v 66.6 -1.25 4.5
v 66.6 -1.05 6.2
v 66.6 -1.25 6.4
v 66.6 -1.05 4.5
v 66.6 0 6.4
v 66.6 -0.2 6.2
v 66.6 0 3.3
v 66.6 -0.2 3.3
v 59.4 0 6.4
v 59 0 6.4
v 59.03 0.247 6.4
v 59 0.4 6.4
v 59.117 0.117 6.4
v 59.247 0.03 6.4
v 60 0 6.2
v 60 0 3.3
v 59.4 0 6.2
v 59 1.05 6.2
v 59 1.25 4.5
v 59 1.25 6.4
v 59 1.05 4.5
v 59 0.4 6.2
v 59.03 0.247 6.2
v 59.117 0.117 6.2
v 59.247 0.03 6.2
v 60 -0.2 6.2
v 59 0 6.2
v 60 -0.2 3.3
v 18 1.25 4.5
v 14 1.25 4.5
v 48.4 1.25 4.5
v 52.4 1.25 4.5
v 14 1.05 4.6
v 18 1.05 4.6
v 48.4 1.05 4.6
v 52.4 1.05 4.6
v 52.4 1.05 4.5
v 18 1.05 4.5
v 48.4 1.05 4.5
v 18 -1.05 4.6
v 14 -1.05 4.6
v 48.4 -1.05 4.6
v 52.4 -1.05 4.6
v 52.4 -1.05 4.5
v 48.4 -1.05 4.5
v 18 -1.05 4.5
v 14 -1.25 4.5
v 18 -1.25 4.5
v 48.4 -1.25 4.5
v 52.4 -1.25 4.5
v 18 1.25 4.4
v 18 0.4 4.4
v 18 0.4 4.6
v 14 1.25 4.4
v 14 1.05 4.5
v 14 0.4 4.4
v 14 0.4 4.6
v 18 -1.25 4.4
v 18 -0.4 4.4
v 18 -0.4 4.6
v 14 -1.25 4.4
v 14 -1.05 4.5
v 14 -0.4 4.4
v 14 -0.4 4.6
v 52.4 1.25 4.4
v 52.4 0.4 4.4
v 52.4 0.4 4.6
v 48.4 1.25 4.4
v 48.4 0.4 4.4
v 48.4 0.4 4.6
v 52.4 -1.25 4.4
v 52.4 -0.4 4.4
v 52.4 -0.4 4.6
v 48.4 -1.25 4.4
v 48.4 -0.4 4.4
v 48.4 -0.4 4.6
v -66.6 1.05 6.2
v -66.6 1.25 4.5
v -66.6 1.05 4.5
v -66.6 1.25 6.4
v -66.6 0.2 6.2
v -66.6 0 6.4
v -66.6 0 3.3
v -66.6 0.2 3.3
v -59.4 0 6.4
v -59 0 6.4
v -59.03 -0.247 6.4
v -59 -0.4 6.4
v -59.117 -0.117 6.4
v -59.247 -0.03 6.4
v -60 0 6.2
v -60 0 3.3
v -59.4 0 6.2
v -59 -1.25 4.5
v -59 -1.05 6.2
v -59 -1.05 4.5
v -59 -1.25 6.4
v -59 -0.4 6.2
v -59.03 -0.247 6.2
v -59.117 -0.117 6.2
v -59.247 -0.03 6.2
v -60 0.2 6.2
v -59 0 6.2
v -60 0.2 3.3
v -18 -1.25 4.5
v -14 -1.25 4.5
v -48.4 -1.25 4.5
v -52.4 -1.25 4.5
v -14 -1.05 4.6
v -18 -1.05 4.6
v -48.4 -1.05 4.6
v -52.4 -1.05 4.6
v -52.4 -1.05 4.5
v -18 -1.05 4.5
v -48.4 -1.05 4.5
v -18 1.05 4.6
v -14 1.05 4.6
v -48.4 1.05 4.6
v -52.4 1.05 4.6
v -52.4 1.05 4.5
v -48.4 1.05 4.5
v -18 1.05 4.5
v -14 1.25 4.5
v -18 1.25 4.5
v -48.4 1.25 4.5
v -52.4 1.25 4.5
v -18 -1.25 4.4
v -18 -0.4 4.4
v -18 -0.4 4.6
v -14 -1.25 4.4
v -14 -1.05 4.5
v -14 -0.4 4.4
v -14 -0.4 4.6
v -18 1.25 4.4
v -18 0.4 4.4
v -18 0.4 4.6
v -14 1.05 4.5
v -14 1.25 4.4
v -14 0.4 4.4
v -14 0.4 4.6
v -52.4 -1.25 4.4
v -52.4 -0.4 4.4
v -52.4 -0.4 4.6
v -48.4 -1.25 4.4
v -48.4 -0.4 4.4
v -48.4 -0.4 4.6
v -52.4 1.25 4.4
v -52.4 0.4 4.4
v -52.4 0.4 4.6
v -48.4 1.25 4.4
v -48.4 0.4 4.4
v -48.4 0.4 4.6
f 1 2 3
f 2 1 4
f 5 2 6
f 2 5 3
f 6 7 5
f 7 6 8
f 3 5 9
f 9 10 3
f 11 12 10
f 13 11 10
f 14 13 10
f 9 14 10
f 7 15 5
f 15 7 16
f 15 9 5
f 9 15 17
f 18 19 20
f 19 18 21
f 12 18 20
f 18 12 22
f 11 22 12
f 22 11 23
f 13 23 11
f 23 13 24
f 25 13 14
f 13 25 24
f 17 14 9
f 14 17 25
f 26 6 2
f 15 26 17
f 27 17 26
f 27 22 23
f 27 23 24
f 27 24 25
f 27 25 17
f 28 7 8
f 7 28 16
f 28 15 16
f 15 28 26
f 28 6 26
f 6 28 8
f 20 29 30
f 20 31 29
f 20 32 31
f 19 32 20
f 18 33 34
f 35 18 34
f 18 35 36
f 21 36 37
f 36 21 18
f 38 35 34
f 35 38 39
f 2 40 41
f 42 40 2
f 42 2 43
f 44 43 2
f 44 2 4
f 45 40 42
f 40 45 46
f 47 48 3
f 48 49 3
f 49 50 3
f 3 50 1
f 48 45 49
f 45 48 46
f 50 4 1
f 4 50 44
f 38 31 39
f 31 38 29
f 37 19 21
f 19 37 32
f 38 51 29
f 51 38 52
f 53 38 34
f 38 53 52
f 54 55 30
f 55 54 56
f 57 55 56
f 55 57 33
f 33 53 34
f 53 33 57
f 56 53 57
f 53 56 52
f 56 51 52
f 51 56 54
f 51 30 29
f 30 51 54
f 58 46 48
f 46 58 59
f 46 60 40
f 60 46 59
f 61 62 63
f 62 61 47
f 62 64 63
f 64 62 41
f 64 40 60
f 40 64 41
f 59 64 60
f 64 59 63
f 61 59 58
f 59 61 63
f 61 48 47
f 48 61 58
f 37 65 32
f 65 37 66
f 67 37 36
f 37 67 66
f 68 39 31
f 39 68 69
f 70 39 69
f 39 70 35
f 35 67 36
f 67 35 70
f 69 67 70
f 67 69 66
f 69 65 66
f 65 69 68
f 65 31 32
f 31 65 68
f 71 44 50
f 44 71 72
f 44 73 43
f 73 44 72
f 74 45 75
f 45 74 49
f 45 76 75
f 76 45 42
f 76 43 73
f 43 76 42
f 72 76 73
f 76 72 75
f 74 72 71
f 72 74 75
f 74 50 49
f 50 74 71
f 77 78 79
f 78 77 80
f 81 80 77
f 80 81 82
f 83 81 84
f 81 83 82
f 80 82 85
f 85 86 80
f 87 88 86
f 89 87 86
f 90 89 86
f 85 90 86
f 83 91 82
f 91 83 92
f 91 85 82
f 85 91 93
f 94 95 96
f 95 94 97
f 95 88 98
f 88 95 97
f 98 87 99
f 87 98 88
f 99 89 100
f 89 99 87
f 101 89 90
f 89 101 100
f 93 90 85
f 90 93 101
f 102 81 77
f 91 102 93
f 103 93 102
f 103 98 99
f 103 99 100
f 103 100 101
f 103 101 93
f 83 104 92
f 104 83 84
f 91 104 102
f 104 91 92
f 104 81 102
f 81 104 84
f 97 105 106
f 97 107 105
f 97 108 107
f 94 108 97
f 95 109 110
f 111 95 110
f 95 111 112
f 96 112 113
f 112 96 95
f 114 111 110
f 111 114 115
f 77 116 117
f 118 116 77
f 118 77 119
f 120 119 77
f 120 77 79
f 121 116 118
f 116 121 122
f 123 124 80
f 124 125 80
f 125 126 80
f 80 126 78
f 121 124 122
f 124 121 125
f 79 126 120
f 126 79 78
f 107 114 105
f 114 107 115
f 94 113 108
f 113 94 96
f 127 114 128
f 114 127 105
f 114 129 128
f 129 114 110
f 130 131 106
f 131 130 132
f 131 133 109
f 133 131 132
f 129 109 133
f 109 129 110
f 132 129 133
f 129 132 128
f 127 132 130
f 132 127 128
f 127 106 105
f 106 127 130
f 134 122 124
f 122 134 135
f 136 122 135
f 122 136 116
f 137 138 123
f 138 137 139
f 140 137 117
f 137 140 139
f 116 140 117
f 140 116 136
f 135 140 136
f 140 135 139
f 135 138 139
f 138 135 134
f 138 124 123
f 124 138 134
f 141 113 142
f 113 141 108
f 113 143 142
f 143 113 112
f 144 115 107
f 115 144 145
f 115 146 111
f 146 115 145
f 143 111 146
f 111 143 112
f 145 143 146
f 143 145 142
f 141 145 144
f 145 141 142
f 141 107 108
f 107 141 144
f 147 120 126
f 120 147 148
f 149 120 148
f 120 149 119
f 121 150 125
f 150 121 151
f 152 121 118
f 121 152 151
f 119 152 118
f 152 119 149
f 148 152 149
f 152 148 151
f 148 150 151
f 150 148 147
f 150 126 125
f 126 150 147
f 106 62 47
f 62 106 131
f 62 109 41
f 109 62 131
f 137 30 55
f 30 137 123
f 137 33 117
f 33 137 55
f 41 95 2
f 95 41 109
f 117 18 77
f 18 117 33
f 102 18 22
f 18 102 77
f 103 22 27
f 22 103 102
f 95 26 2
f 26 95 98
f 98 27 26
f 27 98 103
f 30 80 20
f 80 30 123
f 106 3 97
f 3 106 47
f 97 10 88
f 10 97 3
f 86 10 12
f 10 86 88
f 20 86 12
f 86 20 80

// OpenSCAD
// file: ../p/1-4edge.scad
use <../lib.scad>
function ldraw_lib__1_4edge() = [
// 0 Circle 0.25
// 0 Name: 1-4edge.dat
// 0 Author: James Jessiman
// 0 !LDRAW_ORG Primitive UPDATE 2017-01
// 0 !LICENSE Licensed under CC BY 4.0 : see CAreadme.txt
// 
// 0 BFC CERTIFY CCW
  [0,"BFC","CERTIFY"],
  [0,"BFC","CCW"],
// 
// 0 !HISTORY 2007-06-22 [PTadmin] Header formatted for Contributor Agreement
// 0 !HISTORY 2008-07-01 [PTadmin] Official Update 2008-01
// 0 !HISTORY 2017-01-15 [Steffen] BFCed
// 0 !HISTORY 2017-12-30 [PTadmin] Official Update 2017-01
// 
// 
// 2 24 1 0 0 0.9239 0 0.3827
  [2,24,1,0,0,0.9239,0,0.3827],
// 2 24 0.9239 0 0.3827 0.7071 0 0.7071
  [2,24,0.9239,0,0.3827,0.7071,0,0.7071],
// 2 24 0.7071 0 0.7071 0.3827 0 0.9239
  [2,24,0.7071,0,0.7071,0.3827,0,0.9239],
// 2 24 0.3827 0 0.9239 0 0 1
  [2,24,0.3827,0,0.9239,0,0,1],
];
module ldraw_lib__1_4edge(step=0, col=false, unit=2/5, alt=false, line=0.2, solid=!$preview)
    makepoly(ldraw_lib__1_4edge(), step=step, col=col, unit=unit, alt=alt, line=line, solid=solid);
ldraw_lib__1_4edge(line=0.2);
// file: ../p/1-4cyli.scad
use <../lib.scad>
function ldraw_lib__1_4cyli() = [
// 0 Cylinder 0.25
// 0 Name: 1-4cyli.dat
// 0 Author: James Jessiman
// 0 !LDRAW_ORG Primitive UPDATE 2012-01
// 0 !LICENSE Licensed under CC BY 4.0 : see CAreadme.txt
// 
// 0 BFC CERTIFY CCW
  [0,"BFC","CERTIFY"],
  [0,"BFC","CCW"],
// 
// 0 !HISTORY 2002-03-23 [sbliss] Added BFC statement.
// 0 !HISTORY 2002-04-25 [PTadmin] Official Update 2002-02
// 0 !HISTORY 2007-06-22 [PTadmin] Header formatted for Contributor Agreement
// 0 !HISTORY 2008-07-01 [PTadmin] Official Update 2008-01
// 0 !HISTORY 2012-02-16 [Philo] Changed to CCW
// 0 !HISTORY 2012-03-30 [PTadmin] Official Update 2012-01
// 
// 
// 4 16 1 1 0 0.9239 1 0.3827 0.9239 0 0.3827 1 0 0
  [4,16,1,1,0,0.9239,1,0.3827,0.9239,0,0.3827,1,0,0],
// 5 24 1 0 0 1 1 0 0.9239 0 0.3827 1 0 -1
  [5,24,1,0,0,1,1,0,0.9239,0,0.3827,1,0,-1],
// 4 16 0.9239 1 0.3827 0.7071 1 0.7071 0.7071 0 0.7071 0.9239 0 0.3827
  [4,16,0.9239,1,0.3827,0.7071,1,0.7071,0.7071,0,0.7071,0.9239,0,0.3827],
// 5 24 0.9239 0 0.3827 0.9239 1 0.3827 0.7071 0 0.7071 1 0 0
  [5,24,0.9239,0,0.3827,0.9239,1,0.3827,0.7071,0,0.7071,1,0,0],
// 4 16 0.7071 1 0.7071 0.3827 1 0.9239 0.3827 0 0.9239 0.7071 0 0.7071
  [4,16,0.7071,1,0.7071,0.3827,1,0.9239,0.3827,0,0.9239,0.7071,0,0.7071],
// 5 24 0.7071 0 0.7071 0.7071 1 0.7071 0.3827 0 0.9239 0.9239 0 0.3827
  [5,24,0.7071,0,0.7071,0.7071,1,0.7071,0.3827,0,0.9239,0.9239,0,0.3827],
// 4 16 0.3827 1 0.9239 0 1 1 0 0 1 0.3827 0 0.9239
  [4,16,0.3827,1,0.9239,0,1,1,0,0,1,0.3827,0,0.9239],
// 5 24 0.3827 0 0.9239 0.3827 1 0.9239 0 0 1 0.7071 0 0.7071
  [5,24,0.3827,0,0.9239,0.3827,1,0.9239,0,0,1,0.7071,0,0.7071],
// 5 24 0 0 1 0 1 1 0.3827 0 0.9239 -1 0 1
  [5,24,0,0,1,0,1,1,0.3827,0,0.9239,-1,0,1],
];
module ldraw_lib__1_4cyli(step=0, col=false, unit=2/5, alt=false, line=0.2, solid=!$preview)
    makepoly(ldraw_lib__1_4cyli(), step=step, col=col, unit=unit, alt=alt, line=line, solid=solid);
ldraw_lib__1_4cyli(line=0.2);
// file: ../p/box3-3.scad
use <../lib.scad>
function ldraw_lib__box3_3() = [
// 0 Box with 3 Adjacent Faces and 3 Missing Edges
// 0 Name: box3-3.dat
// 0 Author: Mark Kennedy [mkennedy]
// 0 !LDRAW_ORG Primitive UPDATE 2004-03
// 0 !LICENSE Licensed under CC BY 4.0 : see CAreadme.txt
// 
// 0 BFC CERTIFY CCW
  [0,"BFC","CERTIFY"],
  [0,"BFC","CCW"],
// 
// 0 !HISTORY 2004-09-15 [PTadmin] Official Update 2004-03
// 0 !HISTORY 2007-06-24 [PTadmin] Header formatted for Contributor Agreement
// 0 !HISTORY 2008-07-01 [PTadmin] Official Update 2008-01
// 
// 
// 2 24 1 1 1 -1 1 1
  [2,24,1,1,1,-1,1,1],
// 2 24 -1 1 1 -1 1 -1
  [2,24,-1,1,1,-1,1,-1],
// 2 24 -1 1 -1 1 1 -1
  [2,24,-1,1,-1,1,1,-1],
// 2 24 1 1 -1 1 1 1
  [2,24,1,1,-1,1,1,1],
// 2 24 1 -1 1 -1 -1 1
  [2,24,1,-1,1,-1,-1,1],
// 2 24 1 -1 -1 1 -1 1
  [2,24,1,-1,-1,1,-1,1],
// 2 24 1 -1 1 1 1 1
  [2,24,1,-1,1,1,1,1],
// 2 24 -1 -1 1 -1 1 1
  [2,24,-1,-1,1,-1,1,1],
// 2 24 1 -1 -1 1 1 -1
  [2,24,1,-1,-1,1,1,-1],
// 0
// 4 16 1 1 1 1 1 -1 -1 1 -1 -1 1 1
  [4,16,1,1,1,1,1,-1,-1,1,-1,-1,1,1],
// 4 16 1 1 1 1 -1 1 1 -1 -1 1 1 -1
  [4,16,1,1,1,1,-1,1,1,-1,-1,1,1,-1],
// 4 16 1 1 1 -1 1 1 -1 -1 1 1 -1 1
  [4,16,1,1,1,-1,1,1,-1,-1,1,1,-1,1],
// 0
// 
];
module ldraw_lib__box3_3(step=0, col=false, unit=2/5, alt=false, line=0.2, solid=!$preview)
    makepoly(ldraw_lib__box3_3(), step=step, col=col, unit=unit, alt=alt, line=line, solid=solid);
ldraw_lib__box3_3(line=0.2);
// file: ../p/4-4edge.scad
use <../lib.scad>
function ldraw_lib__4_4edge() = [
// 0 Circle 1.0
// 0 Name: 4-4edge.dat
// 0 Author: James Jessiman
// 0 !LDRAW_ORG Primitive UPDATE 2017-01
// 0 !LICENSE Licensed under CC BY 4.0 : see CAreadme.txt
// 
// 0 BFC CERTIFY CCW
  [0,"BFC","CERTIFY"],
  [0,"BFC","CCW"],
// 
// 0 !HISTORY 1998-12-15 [PTadmin] Official Update 1998-10
// 0 !HISTORY 2005-12-28 [PTadmin] Official Update 2005-01
// 0 !HISTORY 2007-06-24 [PTadmin] Header formatted for Contributor Agreement
// 0 !HISTORY 2008-07-01 [PTadmin] Official Update 2008-01
// 0 !HISTORY 2017-01-15 [Steffen] BFCed
// 0 !HISTORY 2017-12-30 [PTadmin] Official Update 2017-01
// 
// 
// 2 24 1 0 0 0.9239 0 0.3827
  [2,24,1,0,0,0.9239,0,0.3827],
// 2 24 0.9239 0 0.3827 0.7071 0 0.7071
  [2,24,0.9239,0,0.3827,0.7071,0,0.7071],
// 2 24 0.7071 0 0.7071 0.3827 0 0.9239
  [2,24,0.7071,0,0.7071,0.3827,0,0.9239],
// 2 24 0.3827 0 0.9239 0 0 1
  [2,24,0.3827,0,0.9239,0,0,1],
// 2 24 0 0 1 -0.3827 0 0.9239
  [2,24,0,0,1,-0.3827,0,0.9239],
// 2 24 -0.3827 0 0.9239 -0.7071 0 0.7071
  [2,24,-0.3827,0,0.9239,-0.7071,0,0.7071],
// 2 24 -0.7071 0 0.7071 -0.9239 0 0.3827
  [2,24,-0.7071,0,0.7071,-0.9239,0,0.3827],
// 2 24 -0.9239 0 0.3827 -1 0 -0
  [2,24,-0.9239,0,0.3827,-1,0,-0],
// 2 24 -1 0 -0 -0.9239 0 -0.3827
  [2,24,-1,0,-0,-0.9239,0,-0.3827],
// 2 24 -0.9239 0 -0.3827 -0.7071 0 -0.7071
  [2,24,-0.9239,0,-0.3827,-0.7071,0,-0.7071],
// 2 24 -0.7071 0 -0.7071 -0.3827 0 -0.9239
  [2,24,-0.7071,0,-0.7071,-0.3827,0,-0.9239],
// 2 24 -0.3827 0 -0.9239 0 0 -1
  [2,24,-0.3827,0,-0.9239,0,0,-1],
// 2 24 0 0 -1 0.3827 0 -0.9239
  [2,24,0,0,-1,0.3827,0,-0.9239],
// 2 24 0.3827 0 -0.9239 0.7071 0 -0.7071
  [2,24,0.3827,0,-0.9239,0.7071,0,-0.7071],
// 2 24 0.7071 0 -0.7071 0.9239 0 -0.3827
  [2,24,0.7071,0,-0.7071,0.9239,0,-0.3827],
// 2 24 0.9239 0 -0.3827 1 0 0
  [2,24,0.9239,0,-0.3827,1,0,0],
];
module ldraw_lib__4_4edge(step=0, col=false, unit=2/5, alt=false, line=0.2, solid=!$preview)
    makepoly(ldraw_lib__4_4edge(), step=step, col=col, unit=unit, alt=alt, line=line, solid=solid);
ldraw_lib__4_4edge(line=0.2);
// file: ../p/1-4ndis.scad
use <../lib.scad>
function ldraw_lib__1_4ndis() = [
// 0 Disc Negative 0.25
// 0 Name: 1-4ndis.dat
// 0 Author: James Jessiman
// 0 !LDRAW_ORG Primitive UPDATE 2012-01
// 0 !LICENSE Licensed under CC BY 4.0 : see CAreadme.txt
// 
// 0 BFC CERTIFY CCW
  [0,"BFC","CERTIFY"],
  [0,"BFC","CCW"],
// 
// 0 !HISTORY 2002-03-23 [sbliss] Added BFC Statement
// 0 !HISTORY 2002-04-25 [PTadmin] Official Update 2002-02
// 0 !HISTORY 2007-06-22 [PTadmin] Header formatted for Contributor Agreement
// 0 !HISTORY 2008-07-01 [PTadmin] Official Update 2008-01
// 0 !HISTORY 2012-02-16 [Philo] Changed to CCW
// 0 !HISTORY 2012-03-30 [PTadmin] Official Update 2012-01
// 
// 
// 3 16 0.9239 0 0.3827 1 0 0 1 0 1
  [3,16,0.9239,0,0.3827,1,0,0,1,0,1],
// 3 16 0.7071 0 0.7071 0.9239 0 0.3827 1 0 1
  [3,16,0.7071,0,0.7071,0.9239,0,0.3827,1,0,1],
// 3 16 0.3827 0 0.9239 0.7071 0 0.7071 1 0 1
  [3,16,0.3827,0,0.9239,0.7071,0,0.7071,1,0,1],
// 3 16 0 0 1 0.3827 0 0.9239 1 0 1
  [3,16,0,0,1,0.3827,0,0.9239,1,0,1],
];
module ldraw_lib__1_4ndis(step=0, col=false, unit=2/5, alt=false, line=0.2, solid=!$preview)
    makepoly(ldraw_lib__1_4ndis(), step=step, col=col, unit=unit, alt=alt, line=line, solid=solid);
ldraw_lib__1_4ndis(line=0.2);
// file: ../p/1-4cylo.scad
use <../lib.scad>
use <1-4cyli.scad>
use <1-4edge.scad>
function ldraw_lib__1_4cylo() = [
// 0 Cylinder Open 0.25
// 0 Name: 1-4cylo.dat
// 0 Author: Max Martin Richter [MMR1988]
// 0 !LDRAW_ORG Primitive UPDATE 2010-03
// 0 !LICENSE Licensed under CC BY 4.0 : see CAreadme.txt
// 
// 0 BFC CERTIFY CCW
  [0,"BFC","CERTIFY"],
  [0,"BFC","CCW"],
// 
// 0 !HISTORY 2010-12-31 [PTadmin] Official Update 2010-03
// 
// 
// 1 16 0 0 0 1 0 0 0 1 0 0 0 1 1-4edge.dat
  [1,16,0,0,0,1,0,0,0,1,0,0,0,1, ldraw_lib__1_4edge()],
// 1 16 0 1 0 1 0 0 0 1 0 0 0 1 1-4edge.dat
  [1,16,0,1,0,1,0,0,0,1,0,0,0,1, ldraw_lib__1_4edge()],
// 1 16 0 0 0 1 0 0 0 1 0 0 0 1 1-4cyli.dat
  [1,16,0,0,0,1,0,0,0,1,0,0,0,1, ldraw_lib__1_4cyli()],
];
module ldraw_lib__1_4cylo(step=0, col=false, unit=2/5, alt=false, line=0.2, solid=!$preview)
    makepoly(ldraw_lib__1_4cylo(), step=step, col=col, unit=unit, alt=alt, line=line, solid=solid);
ldraw_lib__1_4cylo(line=0.2);
// file: ../p/box2-7.scad
use <../lib.scad>
function ldraw_lib__box2_7() = [
// 0 Box with  2 Faces without  7 Edges
// 0 Name: box2-7.dat
// 0 Author: Willy Tschager [Holly-Wood]
// 0 !LDRAW_ORG Primitive UPDATE 2024-01
// 0 !LICENSE Licensed under CC BY 4.0 : see CAreadme.txt
// 
// 0 BFC CERTIFY CCW
  [0,"BFC","CERTIFY"],
  [0,"BFC","CCW"],
// 
// 0 !HISTORY 2009-05-02 [PTadmin] Official Update 2009-01
// 0 !HISTORY 2024-01-02 [Holly-Wood] Complete re-write, original by guyvivan
// 0 !HISTORY 2024-01-29 [OrionP] Official Update 2024-01
// 
// 2 24 -1 1 -1 -1 1 1
  [2,24,-1,1,-1,-1,1,1],
// 2 24 1 1 1 1 1 -1
  [2,24,1,1,1,1,1,-1],
// 4 16 -1 1 1 1 1 1 1 1 -1 -1 1 -1
  [4,16,-1,1,1,1,1,1,1,1,-1,-1,1,-1],
// 
// 2 24 -1 1 1 -1 -1 1
  [2,24,-1,1,1,-1,-1,1],
// 2 24 1 1 1 1 -1 1
  [2,24,1,1,1,1,-1,1],
// 4 16 1 -1 1 1 1 1 -1 1 1 -1 -1 1
  [4,16,1,-1,1,1,1,1,-1,1,1,-1,-1,1],
// 
// 2 24 -1 1 1 1 1 1
  [2,24,-1,1,1,1,1,1],
];
module ldraw_lib__box2_7(step=0, col=false, unit=2/5, alt=false, line=0.2, solid=!$preview)
    makepoly(ldraw_lib__box2_7(), step=step, col=col, unit=unit, alt=alt, line=line, solid=solid);
ldraw_lib__box2_7(line=0.2);
// file: ../p/box2-5.scad
use <../lib.scad>
function ldraw_lib__box2_5() = [
// 0 Box with 2 Faces without 5 Edges
// 0 Name: box2-5.dat
// 0 Author: Steffen [Steffen]
// 0 !LDRAW_ORG Primitive UPDATE 2003-03
// 0 !LICENSE Licensed under CC BY 4.0 : see CAreadme.txt
// 
// 0 BFC CERTIFY CCW
  [0,"BFC","CERTIFY"],
  [0,"BFC","CCW"],
// 
// 0 !HISTORY 2003-12-19 [PTadmin] Official Update 2003-03
// 0 !HISTORY 2007-06-24 [PTadmin] Header formatted for Contributor Agreement
// 0 !HISTORY 2008-07-01 [PTadmin] Official Update 2008-01
// 
// 
// 2 24 1 1 1 -1 1 1
  [2,24,1,1,1,-1,1,1],
// 2 24 1 1 -1 -1 1 -1
  [2,24,1,1,-1,-1,1,-1],
// 2 24 1 -1 1 -1 -1 1
  [2,24,1,-1,1,-1,-1,1],
// 2 24 -1 -1 1 -1 1 1
  [2,24,-1,-1,1,-1,1,1],
// 2 24 1 -1 1 1 1 1
  [2,24,1,-1,1,1,1,1],
// 2 24 -1 1 -1 -1 1 1
  [2,24,-1,1,-1,-1,1,1],
// 2 24 1 1 -1 1 1 1
  [2,24,1,1,-1,1,1,1],
// 4 16 1 1 1 1 1 -1 -1 1 -1 -1 1 1
  [4,16,1,1,1,1,1,-1,-1,1,-1,-1,1,1],
// 4 16 1 1 1 -1 1 1 -1 -1 1 1 -1 1
  [4,16,1,1,1,-1,1,1,-1,-1,1,1,-1,1],
// 0
];
module ldraw_lib__box2_5(step=0, col=false, unit=2/5, alt=false, line=0.2, solid=!$preview)
    makepoly(ldraw_lib__box2_5(), step=step, col=col, unit=unit, alt=alt, line=line, solid=solid);
ldraw_lib__box2_5(line=0.2);
// file: s/u9611s03.scad
use <../../lib.scad>
use <../../p/1-4cylo.scad>
use <../../p/1-4ndis.scad>
use <../../p/4-4edge.scad>
use <../../p/box3-3.scad>
function ldraw_lib__s__u9611s03() = [
// 0 ~Train Track  9V Straight - Metal Rail, Interlocking End
// 0 Name: s\u9611s03.dat
// 0 Author: Max Martin Richter [MMR1988]
// 0 !LDRAW_ORG Subpart UPDATE 2025-02
// 0 !LICENSE Licensed under CC BY 4.0 : see CAreadme.txt
// 
// 0 BFC CERTIFY CCW
  [0,"BFC","CERTIFY"],
  [0,"BFC","CCW"],
// 
// 0 !HISTORY 2025-02-27 [OrionP] Official Update 2025-02
// 
// 4 16 8.25 -15.5 -2.625 8.25 -16 -3.125 8.25 -11.25 -3.125 8.25 -11.25 -2.625
  [4,16,8.25,-15.5,-2.625,8.25,-16,-3.125,8.25,-11.25,-3.125,8.25,-11.25,-2.625],
// 4 16 8.25 -16 -3.125 8.25 -15.5 -2.625 8.25 -15.5 -.5 8.25 -16 0
  [4,16,8.25,-16,-3.125,8.25,-15.5,-2.625,8.25,-15.5,-.5,8.25,-16,0],
// 4 16 8.25 -16 0 8.25 -15.5 -.5 8.25 -8.25 -.5 8.25 -8.25 0
  [4,16,8.25,-16,0,8.25,-15.5,-.5,8.25,-8.25,-.5,8.25,-8.25,0],
// 2 24 8.25 -8.25 0 8.25 -16 0
  [2,24,8.25,-8.25,0,8.25,-16,0],
// 2 24 8.25 -16 0 8.25 -16 -3.125
  [2,24,8.25,-16,0,8.25,-16,-3.125],
// 2 24 8.25 -15.5 -.5 8.25 -15.5 -2.625
  [2,24,8.25,-15.5,-.5,8.25,-15.5,-2.625],
// 2 24 8.25 -16 -3.125 8.25 -11.25 -3.125
  [2,24,8.25,-16,-3.125,8.25,-11.25,-3.125],
// 2 24 8.25 -11.25 -2.625 8.25 -15.5 -2.625
  [2,24,8.25,-11.25,-2.625,8.25,-15.5,-2.625],
// 
// 3 16 8.25 -16 -3.125 8.25 -16 0 -9.75 -16 0
  [3,16,8.25,-16,-3.125,8.25,-16,0,-9.75,-16,0],
// 3 16 -9.75 -16 0 -10.75 -16 0 8.25 -16 -3.125
  [3,16,-9.75,-16,0,-10.75,-16,0,8.25,-16,-3.125],
// 1 16 -9.75 -16 1 -1 0 0 0 1 0 0 0 -1 1-4ndis.dat
  [1,16,-9.75,-16,1,-1,0,0,0,1,0,0,0,-1, ldraw_lib__1_4ndis()],
// 
// 4 16 8.25 -16 0 8.25 -8.25 0 -8.25 -8.25 0 -8.25 -15.5 0
  [4,16,8.25,-16,0,8.25,-8.25,0,-8.25,-8.25,0,-8.25,-15.5,0],
// 4 16 -9.75 -16 0 8.25 -16 0 -8.25 -15.5 0 -9.75 -15.5 0
  [4,16,-9.75,-16,0,8.25,-16,0,-8.25,-15.5,0,-9.75,-15.5,0],
// 2 24 -9.75 -15.5 0 -8.25 -15.5 0
  [2,24,-9.75,-15.5,0,-8.25,-15.5,0],
// 2 24 8.25 -16 0 -9.75 -16 0
  [2,24,8.25,-16,0,-9.75,-16,0],
// 2 24 -8.25 -15.5 0 -4.5 -8.25 0
  [2,24,-8.25,-15.5,0,-4.5,-8.25,0],
// 2 24 8.25 -15.5 0 4.5 -8.25 0
  [2,24,8.25,-15.5,0,4.5,-8.25,0],
// 1 16 -2 -10.75 0 1 0 0 0 0 1 0 -1 0 4-4edge.dat
  [1,16,-2,-10.75,0,1,0,0,0,0,1,0,-1,0, ldraw_lib__4_4edge()],
// 
// 4 16 -10.75 -16 3.125 -10.75 -15.5 2.625 -10.75 -11.25 2.625 -10.75 -11.25 3.125
  [4,16,-10.75,-16,3.125,-10.75,-15.5,2.625,-10.75,-11.25,2.625,-10.75,-11.25,3.125],
// 4 16 -10.75 -16 1 -10.75 -15.5 1 -10.75 -15.5 2.625 -10.75 -16 3.125
  [4,16,-10.75,-16,1,-10.75,-15.5,1,-10.75,-15.5,2.625,-10.75,-16,3.125],
// 0 BFC INVERTNEXT
  [0,"BFC","INVERTNEXT"],
// 1 16 -9.75 -16 1 -1 0 0 0 .5 0 0 0 -1 1-4cylo.dat
  [1,16,-9.75,-16,1,-1,0,0,0,.5,0,0,0,-1, ldraw_lib__1_4cylo()],
// 2 24 -10.75 -16 1 -10.75 -16 3.125
  [2,24,-10.75,-16,1,-10.75,-16,3.125],
// 2 24 -10.75 -15.5 1 -10.75 -15.5 2.625
  [2,24,-10.75,-15.5,1,-10.75,-15.5,2.625],
// 2 24 -10.75 -16 3.125 -10.75 -11.25 3.125
  [2,24,-10.75,-16,3.125,-10.75,-11.25,3.125],
// 2 24 -10.75 -15.5 2.625 -10.75 -11.25 2.625
  [2,24,-10.75,-15.5,2.625,-10.75,-11.25,2.625],
// 
// 3 16 -8.25 -15.5 -.5 8.25 -15.5 -.5 8.25 -15.5 -2.625
  [3,16,-8.25,-15.5,-.5,8.25,-15.5,-.5,8.25,-15.5,-2.625],
// 3 16 -8.25 -15.5 0 -8.25 -15.5 -.5 -9.75 -15.5 0
  [3,16,-8.25,-15.5,0,-8.25,-15.5,-.5,-9.75,-15.5,0],
// 3 16 -10.75 -15.5 0 -9.75 -15.5 0 -8.25 -15.5 -.5
  [3,16,-10.75,-15.5,0,-9.75,-15.5,0,-8.25,-15.5,-.5],
// 1 16 -9.75 -15.5 1 -1 0 0 0 -1 0 0 0 -1 1-4ndis.dat
  [1,16,-9.75,-15.5,1,-1,0,0,0,-1,0,0,0,-1, ldraw_lib__1_4ndis()],
// 
// 1 16 0 -11.875 -.25 -8.25 0 0 0 3.625 0 0 0 -.25 box3-3.dat
  [1,16,0,-11.875,-.25,-8.25,0,0,0,3.625,0,0,0,-.25, ldraw_lib__box3_3()],
];
module ldraw_lib__s__u9611s03(step=0, col=false, unit=2/5, alt=false, line=0.2, solid=!$preview)
    makepoly(ldraw_lib__s__u9611s03(), step=step, col=col, unit=unit, alt=alt, line=line, solid=solid);
ldraw_lib__s__u9611s03(line=0.2);
// file: s/u9611s02.scad
use <../../lib.scad>
use <../../p/box2-5.scad>
use <../../p/box2-7.scad>
function ldraw_lib__s__u9611s02() = [
// 0 ~Train Track  9V Straight - Metal Rail, Clamp
// 0 Name: s\u9611s02.dat
// 0 Author: Max Martin Richter [MMR1988]
// 0 !LDRAW_ORG Subpart UPDATE 2025-02
// 0 !LICENSE Licensed under CC BY 4.0 : see CAreadme.txt
// 
// 0 BFC CERTIFY CCW
  [0,"BFC","CERTIFY"],
  [0,"BFC","CCW"],
// 
// 0 !HISTORY 2025-02-27 [OrionP] Official Update 2025-02
// 
// 4 16 5 -11 3.125 5 -11.25 3.125 5 -11.25 2.625 5 -11 1
  [4,16,5,-11,3.125,5,-11.25,3.125,5,-11.25,2.625,5,-11,1],
// 4 16 5 -11.25 2.625 5 -11.5 2.625 5 -11.5 1 5 -11 1
  [4,16,5,-11.25,2.625,5,-11.5,2.625,5,-11.5,1,5,-11,1],
// 4 16 -5 -11.25 2.625 -5 -11.25 3.125 -5 -11 3.125 -5 -11 1
  [4,16,-5,-11.25,2.625,-5,-11.25,3.125,-5,-11,3.125,-5,-11,1],
// 4 16 -5 -11.25 2.625 -5 -11 1 -5 -11.5 1 -5 -11.5 2.625
  [4,16,-5,-11.25,2.625,-5,-11,1,-5,-11.5,1,-5,-11.5,2.625],
// 1 16 0 -11.25 1.8125 5 0 0 0 -.25 0 0 0 -.8125 box2-5.dat
  [1,16,0,-11.25,1.8125,5,0,0,0,-.25,0,0,0,-.8125, ldraw_lib__box2_5()],
// 1 16 0 -11.125 2.0625 5 0 0 0 .125 0 0 0 1.0625 box2-7.dat
  [1,16,0,-11.125,2.0625,5,0,0,0,.125,0,0,0,1.0625, ldraw_lib__box2_7()],
// 2 24 5 -11.5 2.625 5 -11.25 2.625
  [2,24,5,-11.5,2.625,5,-11.25,2.625],
// 2 24 -5 -11.5 2.625 -5 -11.25 2.625
  [2,24,-5,-11.5,2.625,-5,-11.25,2.625],
// 
// 4 16 5 -11.25 -2.625 5 -11.25 -3.125 5 -11 -3.125 5 -11 -1
  [4,16,5,-11.25,-2.625,5,-11.25,-3.125,5,-11,-3.125,5,-11,-1],
// 4 16 5 -11.5 -1 5 -11.5 -2.625 5 -11.25 -2.625 5 -11 -1
  [4,16,5,-11.5,-1,5,-11.5,-2.625,5,-11.25,-2.625,5,-11,-1],
// 4 16 -5 -11 -3.125 -5 -11.25 -3.125 -5 -11.25 -2.625 -5 -11 -1
  [4,16,-5,-11,-3.125,-5,-11.25,-3.125,-5,-11.25,-2.625,-5,-11,-1],
// 4 16 -5 -11.5 -1 -5 -11 -1 -5 -11.25 -2.625 -5 -11.5 -2.625
  [4,16,-5,-11.5,-1,-5,-11,-1,-5,-11.25,-2.625,-5,-11.5,-2.625],
// 1 16 0 -11.25 -1.8125 5 0 0 0 -.25 0 0 0 .8125 box2-5.dat
  [1,16,0,-11.25,-1.8125,5,0,0,0,-.25,0,0,0,.8125, ldraw_lib__box2_5()],
// 1 16 0 -11.125 -2.0625 5 0 0 0 .125 0 0 0 -1.0625 box2-7.dat
  [1,16,0,-11.125,-2.0625,5,0,0,0,.125,0,0,0,-1.0625, ldraw_lib__box2_7()],
// 2 24 5 -11.5 -2.625 5 -11.25 -2.625
  [2,24,5,-11.5,-2.625,5,-11.25,-2.625],
// 2 24 -5 -11.5 -2.625 -5 -11.25 -2.625
  [2,24,-5,-11.5,-2.625,-5,-11.25,-2.625],
];
module ldraw_lib__s__u9611s02(step=0, col=false, unit=2/5, alt=false, line=0.2, solid=!$preview)
    makepoly(ldraw_lib__s__u9611s02(), step=step, col=col, unit=unit, alt=alt, line=line, solid=solid);
ldraw_lib__s__u9611s02(line=0.2);
// file: ../p/rect3.scad
use <../lib.scad>
function ldraw_lib__rect3() = [
// 0 Rectangle with 3 Edges
// 0 Name: rect3.dat
// 0 Author: Mark Kennedy [mkennedy]
// 0 !LDRAW_ORG Primitive UPDATE 2010-01
// 0 !LICENSE Licensed under CC BY 4.0 : see CAreadme.txt
// 
// 0 BFC CERTIFY CCW
  [0,"BFC","CERTIFY"],
  [0,"BFC","CCW"],
// 
// 0 !HISTORY 2003-08-01 [PTadmin] Official Update 2003-02
// 0 !HISTORY 2007-06-24 [PTadmin] Header formatted for Contributor Agreement
// 0 !HISTORY 2008-07-01 [PTadmin] Official Update 2008-01
// 0 !HISTORY 2010-01-17 [mikeheide] Change winding to CCW
// 0 !HISTORY 2010-04-05 [PTadmin] Official Update 2010-01
// 
// 
// 2 24 1 0 1 -1 0 1
  [2,24,1,0,1,-1,0,1],
// 2 24 1 0 1 1 0 -1
  [2,24,1,0,1,1,0,-1],
// 2 24 -1 0 1 -1 0 -1
  [2,24,-1,0,1,-1,0,-1],
// 4 16 -1 0 1 -1 0 -1 1 0 -1 1 0 1
  [4,16,-1,0,1,-1,0,-1,1,0,-1,1,0,1],
// 0 //
];
module ldraw_lib__rect3(step=0, col=false, unit=2/5, alt=false, line=0.2, solid=!$preview)
    makepoly(ldraw_lib__rect3(), step=step, col=col, unit=unit, alt=alt, line=line, solid=solid);
ldraw_lib__rect3(line=0.2);
// file: ../p/rect1.scad
use <../lib.scad>
function ldraw_lib__rect1() = [
// 0 Rectangle with 1 Edge
// 0 Name: rect1.dat
// 0 Author: Chris Dee [cwdee]
// 0 !LDRAW_ORG Primitive UPDATE 2010-01
// 0 !LICENSE Licensed under CC BY 4.0 : see CAreadme.txt
// 
// 0 BFC CERTIFY CCW
  [0,"BFC","CERTIFY"],
  [0,"BFC","CCW"],
// 
// 0 !HISTORY 2003-12-19 [PTadmin] Official Update 2003-03
// 0 !HISTORY 2007-06-24 [PTadmin] Header formatted for Contributor Agreement
// 0 !HISTORY 2008-07-01 [PTadmin] Official Update 2008-01
// 0 !HISTORY 2010-01-17 [mikeheide] changed winding to CCW
// 0 !HISTORY 2010-04-05 [PTadmin] Official Update 2010-01
// 
// 
// 2 24 1 0 -1 1 0 1
  [2,24,1,0,-1,1,0,1],
// 4 16 -1 0 1 -1 0 -1 1 0 -1 1 0 1
  [4,16,-1,0,1,-1,0,-1,1,0,-1,1,0,1],
// 0
];
module ldraw_lib__rect1(step=0, col=false, unit=2/5, alt=false, line=0.2, solid=!$preview)
    makepoly(ldraw_lib__rect1(), step=step, col=col, unit=unit, alt=alt, line=line, solid=solid);
ldraw_lib__rect1(line=0.2);
// file: s/u9611s01.scad
use <../../lib.scad>
use <../../p/rect.scad>
use <../../p/rect1.scad>
use <../../p/rect3.scad>
use <u9611s02.scad>
use <u9611s03.scad>
function ldraw_lib__s__u9611s01() = [
// 0 ~Train Track  9V Straight - Metal Rail, Symmetric Half
// 0 Name: s\u9611s01.dat
// 0 Author: Max Martin Richter [MMR1988]
// 0 !LDRAW_ORG Subpart UPDATE 2025-02
// 0 !LICENSE Licensed under CC BY 4.0 : see CAreadme.txt
// 
// 0 BFC CERTIFY CCW
  [0,"BFC","CERTIFY"],
  [0,"BFC","CCW"],
// 
// 0 !HISTORY 2025-02-27 [OrionP] Official Update 2025-02
// 
// 1 16 158.25 0 0 1 0 0 0 1 0 0 0 1 s\u9611s03.dat
  [1,16,158.25,0,0,1,0,0,0,1,0,0,0,1, ldraw_lib__s__u9611s03()],
// 
// 3 16 147.5 -16 3.125 45 -11.25 3.125 35 -11.25 3.125
  [3,16,147.5,-16,3.125,45,-11.25,3.125,35,-11.25,3.125],
// 3 16 147.5 -16 3.125 121 -11.25 3.125 45 -11.25 3.125
  [3,16,147.5,-16,3.125,121,-11.25,3.125,45,-11.25,3.125],
// 3 16 147.5 -16 3.125 131 -11.25 3.125 121 -11.25 3.125
  [3,16,147.5,-16,3.125,131,-11.25,3.125,121,-11.25,3.125],
// 3 16 147.5 -11.25 3.125 131 -11.25 3.125 147.5 -16 3.125
  [3,16,147.5,-11.25,3.125,131,-11.25,3.125,147.5,-16,3.125],
// 
// 3 16 147.5 -15.5 2.625 35 -11.5 2.625 45 -11.5 2.625
  [3,16,147.5,-15.5,2.625,35,-11.5,2.625,45,-11.5,2.625],
// 3 16 121 -11.5 2.625 147.5 -15.5 2.625 45 -11.5 2.625
  [3,16,121,-11.5,2.625,147.5,-15.5,2.625,45,-11.5,2.625],
// 3 16 147.5 -15.5 2.625 121 -11.5 2.625 131 -11.5 2.625
  [3,16,147.5,-15.5,2.625,121,-11.5,2.625,131,-11.5,2.625],
// 4 16 147.5 -15.5 2.625 131 -11.5 2.625 131 -11.25 2.625 147.5 -11.25 2.625
  [4,16,147.5,-15.5,2.625,131,-11.5,2.625,131,-11.25,2.625,147.5,-11.25,2.625],
// 1 16 83 -11.375 2.625 0 0 38 .125 0 0 0 1 0 rect1.dat
  [1,16,83,-11.375,2.625,0,0,38,.125,0,0,0,1,0, ldraw_lib__rect1()],
// 
// 3 16 166.5 -15.5 -2.625 45 -11.5 -2.625 35 -11.5 -2.625
  [3,16,166.5,-15.5,-2.625,45,-11.5,-2.625,35,-11.5,-2.625],
// 3 16 121 -11.5 -2.625 45 -11.5 -2.625 166.5 -15.5 -2.625
  [3,16,121,-11.5,-2.625,45,-11.5,-2.625,166.5,-15.5,-2.625],
// 3 16 121 -11.5 -2.625 166.5 -15.5 -2.625 131 -11.5 -2.625
  [3,16,121,-11.5,-2.625,166.5,-15.5,-2.625,131,-11.5,-2.625],
// 3 16 131 -11.25 -2.625 131 -11.5 -2.625 166.5 -15.5 -2.625
  [3,16,131,-11.25,-2.625,131,-11.5,-2.625,166.5,-15.5,-2.625],
// 3 16 131 -11.25 -2.625 166.5 -15.5 -2.625 166.5 -11.25 -2.625
  [3,16,131,-11.25,-2.625,166.5,-15.5,-2.625,166.5,-11.25,-2.625],
// 1 16 83 -11.375 -2.625 0 0 38 .125 0 0 0 -1 0 rect1.dat
  [1,16,83,-11.375,-2.625,0,0,38,.125,0,0,0,-1,0, ldraw_lib__rect1()],
// 
// 3 16 35 -11.25 -3.125 45 -11.25 -3.125 166.5 -16 -3.125
  [3,16,35,-11.25,-3.125,45,-11.25,-3.125,166.5,-16,-3.125],
// 3 16 45 -11.25 -3.125 121 -11.25 -3.125 166.5 -16 -3.125
  [3,16,45,-11.25,-3.125,121,-11.25,-3.125,166.5,-16,-3.125],
// 3 16 121 -11.25 -3.125 131 -11.25 -3.125 166.5 -16 -3.125
  [3,16,121,-11.25,-3.125,131,-11.25,-3.125,166.5,-16,-3.125],
// 3 16 166.5 -16 -3.125 131 -11.25 -3.125 166.5 -11.25 -3.125
  [3,16,166.5,-16,-3.125,131,-11.25,-3.125,166.5,-11.25,-3.125],
// 
// 1 16 83 -11.25 -2.875 38 0 0 0 -1 0 0 0 -.25 rect3.dat
  [1,16,83,-11.25,-2.875,38,0,0,0,-1,0,0,0,-.25, ldraw_lib__rect3()],
// 1 16 148.75 -11.25 -2.875 -17.75 0 0 0 -1 0 0 0 .25 rect.dat
  [1,16,148.75,-11.25,-2.875,-17.75,0,0,0,-1,0,0,0,.25, ldraw_lib__rect()],
// 1 16 83 -11.25 2.875 38 0 0 0 -1 0 0 0 .25 rect3.dat
  [1,16,83,-11.25,2.875,38,0,0,0,-1,0,0,0,.25, ldraw_lib__rect3()],
// 1 16 139.25 -11.25 2.875 -8.25 0 0 0 -1 0 0 0 .25 rect.dat
  [1,16,139.25,-11.25,2.875,-8.25,0,0,0,-1,0,0,0,.25, ldraw_lib__rect()],
// 
// 1 16 40 0 0 1 0 0 0 1 0 0 0 1 s\u9611s02.dat
  [1,16,40,0,0,1,0,0,0,1,0,0,0,1, ldraw_lib__s__u9611s02()],
// 1 16 126 0 0 1 0 0 0 1 0 0 0 1 s\u9611s02.dat
  [1,16,126,0,0,1,0,0,0,1,0,0,0,1, ldraw_lib__s__u9611s02()],
];
module ldraw_lib__s__u9611s01(step=0, col=false, unit=2/5, alt=false, line=0.2, solid=!$preview)
    makepoly(ldraw_lib__s__u9611s01(), step=step, col=col, unit=unit, alt=alt, line=line, solid=solid);
ldraw_lib__s__u9611s01(line=0.2);
// file: ../p/rect.scad
use <../lib.scad>
function ldraw_lib__rect() = [
// 0 Rectangle
// 0 Name: rect.dat
// 0 Author: James Jessiman
// 0 !LDRAW_ORG Primitive UPDATE 2010-01
// 0 !LICENSE Licensed under CC BY 4.0 : see CAreadme.txt
// 
// 0 BFC CERTIFY CCW
  [0,"BFC","CERTIFY"],
  [0,"BFC","CCW"],
// 
// 0 !HISTORY 2002-04-05 [hafhead] Added BFC statement
// 0 !HISTORY 2002-04-25 [PTadmin] Official Update 2002-02
// 0 !HISTORY 2007-06-24 [PTadmin] Header formatted for Contributor Agreement
// 0 !HISTORY 2008-07-01 [PTadmin] Official Update 2008-01
// 0 !HISTORY 2010-01-17 [mikeheide] changed winding to CCW
// 0 !HISTORY 2010-04-05 [PTadmin] Official Update 2010-01
// 
// 
// 2 24 1 0 1 -1 0 1
  [2,24,1,0,1,-1,0,1],
// 2 24 -1 0 1 -1 0 -1
  [2,24,-1,0,1,-1,0,-1],
// 2 24 -1 0 -1 1 0 -1
  [2,24,-1,0,-1,1,0,-1],
// 2 24 1 0 -1 1 0 1
  [2,24,1,0,-1,1,0,1],
// 4 16 -1 0 1 -1 0 -1 1 0 -1 1 0 1
  [4,16,-1,0,1,-1,0,-1,1,0,-1,1,0,1],
// 0
];
module ldraw_lib__rect(step=0, col=false, unit=2/5, alt=false, line=0.2, solid=!$preview)
    makepoly(ldraw_lib__rect(), step=step, col=col, unit=unit, alt=alt, line=line, solid=solid);
ldraw_lib__rect(line=0.2);
// main file
use <../lib.scad>
use <../p/rect.scad>
use <s/u9611s01.scad>
function ldraw_lib__u9611() = [
// 0 ~Train Track  9V Straight - Metal Rail
// 0 Name: u9611.dat
// 0 Author: Max Martin Richter [MMR1988]
// 0 !LDRAW_ORG Part UPDATE 2025-02
// 0 !LICENSE Licensed under CC BY 4.0 : see CAreadme.txt
// 
// 0 BFC CERTIFY CCW
  [0,"BFC","CERTIFY"],
  [0,"BFC","CCW"],
// 
// 0 !HISTORY 2024-05-30 [MMR1988] Rewritten from scratch, original by Holly-Wood
// 0 !HISTORY 2025-02-27 [OrionP] Official Update 2025-02
// 
// 1 16 0 0 0 1 0 0 0 1 0 0 0 1 s\u9611s01.dat
  [1,16,0,0,0,1,0,0,0,1,0,0,0,1, ldraw_lib__s__u9611s01()],
// 1 16 0 0 0 -1 0 0 0 1 0 0 0 -1 s\u9611s01.dat
  [1,16,0,0,0,-1,0,0,0,1,0,0,0,-1, ldraw_lib__s__u9611s01()],
// 
// 1 16 0 -11.25 -2.875 35 0 0 0 -1 0 0 0 -.25 rect.dat
  [1,16,0,-11.25,-2.875,35,0,0,0,-1,0,0,0,-.25, ldraw_lib__rect()],
// 4 16 -35 -11.25 -2.625 -35 -11.5 -2.625 35 -11.5 -2.625 35 -11.25 -2.625
  [4,16,-35,-11.25,-2.625,-35,-11.5,-2.625,35,-11.5,-2.625,35,-11.25,-2.625],
// 1 16 0 -11.25 2.875 35 0 0 0 -1 0 0 0 .25 rect.dat
  [1,16,0,-11.25,2.875,35,0,0,0,-1,0,0,0,.25, ldraw_lib__rect()],
// 4 16 -35 -11.25 2.625 35 -11.25 2.625 35 -11.5 2.625 -35 -11.5 2.625
  [4,16,-35,-11.25,2.625,35,-11.25,2.625,35,-11.5,2.625,-35,-11.5,2.625],
// 
// 4 16 166.5 -15.5 -2.625 35 -11.5 -2.625 -35 -11.5 -2.625 -147.5 -15.5 -2.625
  [4,16,166.5,-15.5,-2.625,35,-11.5,-2.625,-35,-11.5,-2.625,-147.5,-15.5,-2.625],
// 4 16 -166.5 -15.5 2.625 -35 -11.5 2.625 35 -11.5 2.625 147.5 -15.5 2.625
  [4,16,-166.5,-15.5,2.625,-35,-11.5,2.625,35,-11.5,2.625,147.5,-15.5,2.625],
// 4 16 147.5 -15.5 1 -150 -15.5 .5 -166.5 -15.5 2.625 147.5 -15.5 2.625
  [4,16,147.5,-15.5,1,-150,-15.5,.5,-166.5,-15.5,2.625,147.5,-15.5,2.625],
// 4 16 -147.5 -15.5 0 -150 -15.5 .5 147.5 -15.5 1 147.5 -15.5 0
  [4,16,-147.5,-15.5,0,-150,-15.5,.5,147.5,-15.5,1,147.5,-15.5,0],
// 4 16 -147.5 -15.5 -1 150 -15.5 -.5 166.5 -15.5 -2.625 -147.5 -15.5 -2.625
  [4,16,-147.5,-15.5,-1,150,-15.5,-.5,166.5,-15.5,-2.625,-147.5,-15.5,-2.625],
// 4 16 147.5 -15.5 0 150 -15.5 -.5 -147.5 -15.5 -1 -147.5 -15.5 0
  [4,16,147.5,-15.5,0,150,-15.5,-.5,-147.5,-15.5,-1,-147.5,-15.5,0],
// 4 16 147.5 -16 3.125 35 -11.25 3.125 -35 -11.25 3.125 -166.5 -16 3.125
  [4,16,147.5,-16,3.125,35,-11.25,3.125,-35,-11.25,3.125,-166.5,-16,3.125],
// 4 16 -35 -11.25 -3.125 35 -11.25 -3.125 166.5 -16 -3.125 -147.5 -16 -3.125
  [4,16,-35,-11.25,-3.125,35,-11.25,-3.125,166.5,-16,-3.125,-147.5,-16,-3.125],
// 4 16 -147.5 -16 -1 -147.5 -16 -3.125 166.5 -16 -3.125 147.5 -16 0
  [4,16,-147.5,-16,-1,-147.5,-16,-3.125,166.5,-16,-3.125,147.5,-16,0],
// 4 16 147.5 -16 0 147.5 -16 1 -147.5 -16 0 -147.5 -16 -1
  [4,16,147.5,-16,0,147.5,-16,1,-147.5,-16,0,-147.5,-16,-1],
// 4 16 147.5 -16 3.125 -166.5 -16 3.125 -147.5 -16 0 147.5 -16 1
  [4,16,147.5,-16,3.125,-166.5,-16,3.125,-147.5,-16,0,147.5,-16,1],
// 2 24 147.5 -16 3.125 -166.5 -16 3.125
  [2,24,147.5,-16,3.125,-166.5,-16,3.125],
// 2 24 -147.5 -16 -3.125 166.5 -16 -3.125
  [2,24,-147.5,-16,-3.125,166.5,-16,-3.125],
// 2 24 147.5 -15.5 2.625 -166.5 -15.5 2.625
  [2,24,147.5,-15.5,2.625,-166.5,-15.5,2.625],
// 2 24 -147.5 -15.5 -2.625 166.5 -15.5 -2.625
  [2,24,-147.5,-15.5,-2.625,166.5,-15.5,-2.625],
];
module ldraw_lib__u9611(step=0, col=false, unit=2/5, alt=false, line=0.2, solid=!$preview)
    makepoly(ldraw_lib__u9611(), step=step, col=col, unit=unit, alt=alt, line=line, solid=solid);
ldraw_lib__u9611(line=0.2);
